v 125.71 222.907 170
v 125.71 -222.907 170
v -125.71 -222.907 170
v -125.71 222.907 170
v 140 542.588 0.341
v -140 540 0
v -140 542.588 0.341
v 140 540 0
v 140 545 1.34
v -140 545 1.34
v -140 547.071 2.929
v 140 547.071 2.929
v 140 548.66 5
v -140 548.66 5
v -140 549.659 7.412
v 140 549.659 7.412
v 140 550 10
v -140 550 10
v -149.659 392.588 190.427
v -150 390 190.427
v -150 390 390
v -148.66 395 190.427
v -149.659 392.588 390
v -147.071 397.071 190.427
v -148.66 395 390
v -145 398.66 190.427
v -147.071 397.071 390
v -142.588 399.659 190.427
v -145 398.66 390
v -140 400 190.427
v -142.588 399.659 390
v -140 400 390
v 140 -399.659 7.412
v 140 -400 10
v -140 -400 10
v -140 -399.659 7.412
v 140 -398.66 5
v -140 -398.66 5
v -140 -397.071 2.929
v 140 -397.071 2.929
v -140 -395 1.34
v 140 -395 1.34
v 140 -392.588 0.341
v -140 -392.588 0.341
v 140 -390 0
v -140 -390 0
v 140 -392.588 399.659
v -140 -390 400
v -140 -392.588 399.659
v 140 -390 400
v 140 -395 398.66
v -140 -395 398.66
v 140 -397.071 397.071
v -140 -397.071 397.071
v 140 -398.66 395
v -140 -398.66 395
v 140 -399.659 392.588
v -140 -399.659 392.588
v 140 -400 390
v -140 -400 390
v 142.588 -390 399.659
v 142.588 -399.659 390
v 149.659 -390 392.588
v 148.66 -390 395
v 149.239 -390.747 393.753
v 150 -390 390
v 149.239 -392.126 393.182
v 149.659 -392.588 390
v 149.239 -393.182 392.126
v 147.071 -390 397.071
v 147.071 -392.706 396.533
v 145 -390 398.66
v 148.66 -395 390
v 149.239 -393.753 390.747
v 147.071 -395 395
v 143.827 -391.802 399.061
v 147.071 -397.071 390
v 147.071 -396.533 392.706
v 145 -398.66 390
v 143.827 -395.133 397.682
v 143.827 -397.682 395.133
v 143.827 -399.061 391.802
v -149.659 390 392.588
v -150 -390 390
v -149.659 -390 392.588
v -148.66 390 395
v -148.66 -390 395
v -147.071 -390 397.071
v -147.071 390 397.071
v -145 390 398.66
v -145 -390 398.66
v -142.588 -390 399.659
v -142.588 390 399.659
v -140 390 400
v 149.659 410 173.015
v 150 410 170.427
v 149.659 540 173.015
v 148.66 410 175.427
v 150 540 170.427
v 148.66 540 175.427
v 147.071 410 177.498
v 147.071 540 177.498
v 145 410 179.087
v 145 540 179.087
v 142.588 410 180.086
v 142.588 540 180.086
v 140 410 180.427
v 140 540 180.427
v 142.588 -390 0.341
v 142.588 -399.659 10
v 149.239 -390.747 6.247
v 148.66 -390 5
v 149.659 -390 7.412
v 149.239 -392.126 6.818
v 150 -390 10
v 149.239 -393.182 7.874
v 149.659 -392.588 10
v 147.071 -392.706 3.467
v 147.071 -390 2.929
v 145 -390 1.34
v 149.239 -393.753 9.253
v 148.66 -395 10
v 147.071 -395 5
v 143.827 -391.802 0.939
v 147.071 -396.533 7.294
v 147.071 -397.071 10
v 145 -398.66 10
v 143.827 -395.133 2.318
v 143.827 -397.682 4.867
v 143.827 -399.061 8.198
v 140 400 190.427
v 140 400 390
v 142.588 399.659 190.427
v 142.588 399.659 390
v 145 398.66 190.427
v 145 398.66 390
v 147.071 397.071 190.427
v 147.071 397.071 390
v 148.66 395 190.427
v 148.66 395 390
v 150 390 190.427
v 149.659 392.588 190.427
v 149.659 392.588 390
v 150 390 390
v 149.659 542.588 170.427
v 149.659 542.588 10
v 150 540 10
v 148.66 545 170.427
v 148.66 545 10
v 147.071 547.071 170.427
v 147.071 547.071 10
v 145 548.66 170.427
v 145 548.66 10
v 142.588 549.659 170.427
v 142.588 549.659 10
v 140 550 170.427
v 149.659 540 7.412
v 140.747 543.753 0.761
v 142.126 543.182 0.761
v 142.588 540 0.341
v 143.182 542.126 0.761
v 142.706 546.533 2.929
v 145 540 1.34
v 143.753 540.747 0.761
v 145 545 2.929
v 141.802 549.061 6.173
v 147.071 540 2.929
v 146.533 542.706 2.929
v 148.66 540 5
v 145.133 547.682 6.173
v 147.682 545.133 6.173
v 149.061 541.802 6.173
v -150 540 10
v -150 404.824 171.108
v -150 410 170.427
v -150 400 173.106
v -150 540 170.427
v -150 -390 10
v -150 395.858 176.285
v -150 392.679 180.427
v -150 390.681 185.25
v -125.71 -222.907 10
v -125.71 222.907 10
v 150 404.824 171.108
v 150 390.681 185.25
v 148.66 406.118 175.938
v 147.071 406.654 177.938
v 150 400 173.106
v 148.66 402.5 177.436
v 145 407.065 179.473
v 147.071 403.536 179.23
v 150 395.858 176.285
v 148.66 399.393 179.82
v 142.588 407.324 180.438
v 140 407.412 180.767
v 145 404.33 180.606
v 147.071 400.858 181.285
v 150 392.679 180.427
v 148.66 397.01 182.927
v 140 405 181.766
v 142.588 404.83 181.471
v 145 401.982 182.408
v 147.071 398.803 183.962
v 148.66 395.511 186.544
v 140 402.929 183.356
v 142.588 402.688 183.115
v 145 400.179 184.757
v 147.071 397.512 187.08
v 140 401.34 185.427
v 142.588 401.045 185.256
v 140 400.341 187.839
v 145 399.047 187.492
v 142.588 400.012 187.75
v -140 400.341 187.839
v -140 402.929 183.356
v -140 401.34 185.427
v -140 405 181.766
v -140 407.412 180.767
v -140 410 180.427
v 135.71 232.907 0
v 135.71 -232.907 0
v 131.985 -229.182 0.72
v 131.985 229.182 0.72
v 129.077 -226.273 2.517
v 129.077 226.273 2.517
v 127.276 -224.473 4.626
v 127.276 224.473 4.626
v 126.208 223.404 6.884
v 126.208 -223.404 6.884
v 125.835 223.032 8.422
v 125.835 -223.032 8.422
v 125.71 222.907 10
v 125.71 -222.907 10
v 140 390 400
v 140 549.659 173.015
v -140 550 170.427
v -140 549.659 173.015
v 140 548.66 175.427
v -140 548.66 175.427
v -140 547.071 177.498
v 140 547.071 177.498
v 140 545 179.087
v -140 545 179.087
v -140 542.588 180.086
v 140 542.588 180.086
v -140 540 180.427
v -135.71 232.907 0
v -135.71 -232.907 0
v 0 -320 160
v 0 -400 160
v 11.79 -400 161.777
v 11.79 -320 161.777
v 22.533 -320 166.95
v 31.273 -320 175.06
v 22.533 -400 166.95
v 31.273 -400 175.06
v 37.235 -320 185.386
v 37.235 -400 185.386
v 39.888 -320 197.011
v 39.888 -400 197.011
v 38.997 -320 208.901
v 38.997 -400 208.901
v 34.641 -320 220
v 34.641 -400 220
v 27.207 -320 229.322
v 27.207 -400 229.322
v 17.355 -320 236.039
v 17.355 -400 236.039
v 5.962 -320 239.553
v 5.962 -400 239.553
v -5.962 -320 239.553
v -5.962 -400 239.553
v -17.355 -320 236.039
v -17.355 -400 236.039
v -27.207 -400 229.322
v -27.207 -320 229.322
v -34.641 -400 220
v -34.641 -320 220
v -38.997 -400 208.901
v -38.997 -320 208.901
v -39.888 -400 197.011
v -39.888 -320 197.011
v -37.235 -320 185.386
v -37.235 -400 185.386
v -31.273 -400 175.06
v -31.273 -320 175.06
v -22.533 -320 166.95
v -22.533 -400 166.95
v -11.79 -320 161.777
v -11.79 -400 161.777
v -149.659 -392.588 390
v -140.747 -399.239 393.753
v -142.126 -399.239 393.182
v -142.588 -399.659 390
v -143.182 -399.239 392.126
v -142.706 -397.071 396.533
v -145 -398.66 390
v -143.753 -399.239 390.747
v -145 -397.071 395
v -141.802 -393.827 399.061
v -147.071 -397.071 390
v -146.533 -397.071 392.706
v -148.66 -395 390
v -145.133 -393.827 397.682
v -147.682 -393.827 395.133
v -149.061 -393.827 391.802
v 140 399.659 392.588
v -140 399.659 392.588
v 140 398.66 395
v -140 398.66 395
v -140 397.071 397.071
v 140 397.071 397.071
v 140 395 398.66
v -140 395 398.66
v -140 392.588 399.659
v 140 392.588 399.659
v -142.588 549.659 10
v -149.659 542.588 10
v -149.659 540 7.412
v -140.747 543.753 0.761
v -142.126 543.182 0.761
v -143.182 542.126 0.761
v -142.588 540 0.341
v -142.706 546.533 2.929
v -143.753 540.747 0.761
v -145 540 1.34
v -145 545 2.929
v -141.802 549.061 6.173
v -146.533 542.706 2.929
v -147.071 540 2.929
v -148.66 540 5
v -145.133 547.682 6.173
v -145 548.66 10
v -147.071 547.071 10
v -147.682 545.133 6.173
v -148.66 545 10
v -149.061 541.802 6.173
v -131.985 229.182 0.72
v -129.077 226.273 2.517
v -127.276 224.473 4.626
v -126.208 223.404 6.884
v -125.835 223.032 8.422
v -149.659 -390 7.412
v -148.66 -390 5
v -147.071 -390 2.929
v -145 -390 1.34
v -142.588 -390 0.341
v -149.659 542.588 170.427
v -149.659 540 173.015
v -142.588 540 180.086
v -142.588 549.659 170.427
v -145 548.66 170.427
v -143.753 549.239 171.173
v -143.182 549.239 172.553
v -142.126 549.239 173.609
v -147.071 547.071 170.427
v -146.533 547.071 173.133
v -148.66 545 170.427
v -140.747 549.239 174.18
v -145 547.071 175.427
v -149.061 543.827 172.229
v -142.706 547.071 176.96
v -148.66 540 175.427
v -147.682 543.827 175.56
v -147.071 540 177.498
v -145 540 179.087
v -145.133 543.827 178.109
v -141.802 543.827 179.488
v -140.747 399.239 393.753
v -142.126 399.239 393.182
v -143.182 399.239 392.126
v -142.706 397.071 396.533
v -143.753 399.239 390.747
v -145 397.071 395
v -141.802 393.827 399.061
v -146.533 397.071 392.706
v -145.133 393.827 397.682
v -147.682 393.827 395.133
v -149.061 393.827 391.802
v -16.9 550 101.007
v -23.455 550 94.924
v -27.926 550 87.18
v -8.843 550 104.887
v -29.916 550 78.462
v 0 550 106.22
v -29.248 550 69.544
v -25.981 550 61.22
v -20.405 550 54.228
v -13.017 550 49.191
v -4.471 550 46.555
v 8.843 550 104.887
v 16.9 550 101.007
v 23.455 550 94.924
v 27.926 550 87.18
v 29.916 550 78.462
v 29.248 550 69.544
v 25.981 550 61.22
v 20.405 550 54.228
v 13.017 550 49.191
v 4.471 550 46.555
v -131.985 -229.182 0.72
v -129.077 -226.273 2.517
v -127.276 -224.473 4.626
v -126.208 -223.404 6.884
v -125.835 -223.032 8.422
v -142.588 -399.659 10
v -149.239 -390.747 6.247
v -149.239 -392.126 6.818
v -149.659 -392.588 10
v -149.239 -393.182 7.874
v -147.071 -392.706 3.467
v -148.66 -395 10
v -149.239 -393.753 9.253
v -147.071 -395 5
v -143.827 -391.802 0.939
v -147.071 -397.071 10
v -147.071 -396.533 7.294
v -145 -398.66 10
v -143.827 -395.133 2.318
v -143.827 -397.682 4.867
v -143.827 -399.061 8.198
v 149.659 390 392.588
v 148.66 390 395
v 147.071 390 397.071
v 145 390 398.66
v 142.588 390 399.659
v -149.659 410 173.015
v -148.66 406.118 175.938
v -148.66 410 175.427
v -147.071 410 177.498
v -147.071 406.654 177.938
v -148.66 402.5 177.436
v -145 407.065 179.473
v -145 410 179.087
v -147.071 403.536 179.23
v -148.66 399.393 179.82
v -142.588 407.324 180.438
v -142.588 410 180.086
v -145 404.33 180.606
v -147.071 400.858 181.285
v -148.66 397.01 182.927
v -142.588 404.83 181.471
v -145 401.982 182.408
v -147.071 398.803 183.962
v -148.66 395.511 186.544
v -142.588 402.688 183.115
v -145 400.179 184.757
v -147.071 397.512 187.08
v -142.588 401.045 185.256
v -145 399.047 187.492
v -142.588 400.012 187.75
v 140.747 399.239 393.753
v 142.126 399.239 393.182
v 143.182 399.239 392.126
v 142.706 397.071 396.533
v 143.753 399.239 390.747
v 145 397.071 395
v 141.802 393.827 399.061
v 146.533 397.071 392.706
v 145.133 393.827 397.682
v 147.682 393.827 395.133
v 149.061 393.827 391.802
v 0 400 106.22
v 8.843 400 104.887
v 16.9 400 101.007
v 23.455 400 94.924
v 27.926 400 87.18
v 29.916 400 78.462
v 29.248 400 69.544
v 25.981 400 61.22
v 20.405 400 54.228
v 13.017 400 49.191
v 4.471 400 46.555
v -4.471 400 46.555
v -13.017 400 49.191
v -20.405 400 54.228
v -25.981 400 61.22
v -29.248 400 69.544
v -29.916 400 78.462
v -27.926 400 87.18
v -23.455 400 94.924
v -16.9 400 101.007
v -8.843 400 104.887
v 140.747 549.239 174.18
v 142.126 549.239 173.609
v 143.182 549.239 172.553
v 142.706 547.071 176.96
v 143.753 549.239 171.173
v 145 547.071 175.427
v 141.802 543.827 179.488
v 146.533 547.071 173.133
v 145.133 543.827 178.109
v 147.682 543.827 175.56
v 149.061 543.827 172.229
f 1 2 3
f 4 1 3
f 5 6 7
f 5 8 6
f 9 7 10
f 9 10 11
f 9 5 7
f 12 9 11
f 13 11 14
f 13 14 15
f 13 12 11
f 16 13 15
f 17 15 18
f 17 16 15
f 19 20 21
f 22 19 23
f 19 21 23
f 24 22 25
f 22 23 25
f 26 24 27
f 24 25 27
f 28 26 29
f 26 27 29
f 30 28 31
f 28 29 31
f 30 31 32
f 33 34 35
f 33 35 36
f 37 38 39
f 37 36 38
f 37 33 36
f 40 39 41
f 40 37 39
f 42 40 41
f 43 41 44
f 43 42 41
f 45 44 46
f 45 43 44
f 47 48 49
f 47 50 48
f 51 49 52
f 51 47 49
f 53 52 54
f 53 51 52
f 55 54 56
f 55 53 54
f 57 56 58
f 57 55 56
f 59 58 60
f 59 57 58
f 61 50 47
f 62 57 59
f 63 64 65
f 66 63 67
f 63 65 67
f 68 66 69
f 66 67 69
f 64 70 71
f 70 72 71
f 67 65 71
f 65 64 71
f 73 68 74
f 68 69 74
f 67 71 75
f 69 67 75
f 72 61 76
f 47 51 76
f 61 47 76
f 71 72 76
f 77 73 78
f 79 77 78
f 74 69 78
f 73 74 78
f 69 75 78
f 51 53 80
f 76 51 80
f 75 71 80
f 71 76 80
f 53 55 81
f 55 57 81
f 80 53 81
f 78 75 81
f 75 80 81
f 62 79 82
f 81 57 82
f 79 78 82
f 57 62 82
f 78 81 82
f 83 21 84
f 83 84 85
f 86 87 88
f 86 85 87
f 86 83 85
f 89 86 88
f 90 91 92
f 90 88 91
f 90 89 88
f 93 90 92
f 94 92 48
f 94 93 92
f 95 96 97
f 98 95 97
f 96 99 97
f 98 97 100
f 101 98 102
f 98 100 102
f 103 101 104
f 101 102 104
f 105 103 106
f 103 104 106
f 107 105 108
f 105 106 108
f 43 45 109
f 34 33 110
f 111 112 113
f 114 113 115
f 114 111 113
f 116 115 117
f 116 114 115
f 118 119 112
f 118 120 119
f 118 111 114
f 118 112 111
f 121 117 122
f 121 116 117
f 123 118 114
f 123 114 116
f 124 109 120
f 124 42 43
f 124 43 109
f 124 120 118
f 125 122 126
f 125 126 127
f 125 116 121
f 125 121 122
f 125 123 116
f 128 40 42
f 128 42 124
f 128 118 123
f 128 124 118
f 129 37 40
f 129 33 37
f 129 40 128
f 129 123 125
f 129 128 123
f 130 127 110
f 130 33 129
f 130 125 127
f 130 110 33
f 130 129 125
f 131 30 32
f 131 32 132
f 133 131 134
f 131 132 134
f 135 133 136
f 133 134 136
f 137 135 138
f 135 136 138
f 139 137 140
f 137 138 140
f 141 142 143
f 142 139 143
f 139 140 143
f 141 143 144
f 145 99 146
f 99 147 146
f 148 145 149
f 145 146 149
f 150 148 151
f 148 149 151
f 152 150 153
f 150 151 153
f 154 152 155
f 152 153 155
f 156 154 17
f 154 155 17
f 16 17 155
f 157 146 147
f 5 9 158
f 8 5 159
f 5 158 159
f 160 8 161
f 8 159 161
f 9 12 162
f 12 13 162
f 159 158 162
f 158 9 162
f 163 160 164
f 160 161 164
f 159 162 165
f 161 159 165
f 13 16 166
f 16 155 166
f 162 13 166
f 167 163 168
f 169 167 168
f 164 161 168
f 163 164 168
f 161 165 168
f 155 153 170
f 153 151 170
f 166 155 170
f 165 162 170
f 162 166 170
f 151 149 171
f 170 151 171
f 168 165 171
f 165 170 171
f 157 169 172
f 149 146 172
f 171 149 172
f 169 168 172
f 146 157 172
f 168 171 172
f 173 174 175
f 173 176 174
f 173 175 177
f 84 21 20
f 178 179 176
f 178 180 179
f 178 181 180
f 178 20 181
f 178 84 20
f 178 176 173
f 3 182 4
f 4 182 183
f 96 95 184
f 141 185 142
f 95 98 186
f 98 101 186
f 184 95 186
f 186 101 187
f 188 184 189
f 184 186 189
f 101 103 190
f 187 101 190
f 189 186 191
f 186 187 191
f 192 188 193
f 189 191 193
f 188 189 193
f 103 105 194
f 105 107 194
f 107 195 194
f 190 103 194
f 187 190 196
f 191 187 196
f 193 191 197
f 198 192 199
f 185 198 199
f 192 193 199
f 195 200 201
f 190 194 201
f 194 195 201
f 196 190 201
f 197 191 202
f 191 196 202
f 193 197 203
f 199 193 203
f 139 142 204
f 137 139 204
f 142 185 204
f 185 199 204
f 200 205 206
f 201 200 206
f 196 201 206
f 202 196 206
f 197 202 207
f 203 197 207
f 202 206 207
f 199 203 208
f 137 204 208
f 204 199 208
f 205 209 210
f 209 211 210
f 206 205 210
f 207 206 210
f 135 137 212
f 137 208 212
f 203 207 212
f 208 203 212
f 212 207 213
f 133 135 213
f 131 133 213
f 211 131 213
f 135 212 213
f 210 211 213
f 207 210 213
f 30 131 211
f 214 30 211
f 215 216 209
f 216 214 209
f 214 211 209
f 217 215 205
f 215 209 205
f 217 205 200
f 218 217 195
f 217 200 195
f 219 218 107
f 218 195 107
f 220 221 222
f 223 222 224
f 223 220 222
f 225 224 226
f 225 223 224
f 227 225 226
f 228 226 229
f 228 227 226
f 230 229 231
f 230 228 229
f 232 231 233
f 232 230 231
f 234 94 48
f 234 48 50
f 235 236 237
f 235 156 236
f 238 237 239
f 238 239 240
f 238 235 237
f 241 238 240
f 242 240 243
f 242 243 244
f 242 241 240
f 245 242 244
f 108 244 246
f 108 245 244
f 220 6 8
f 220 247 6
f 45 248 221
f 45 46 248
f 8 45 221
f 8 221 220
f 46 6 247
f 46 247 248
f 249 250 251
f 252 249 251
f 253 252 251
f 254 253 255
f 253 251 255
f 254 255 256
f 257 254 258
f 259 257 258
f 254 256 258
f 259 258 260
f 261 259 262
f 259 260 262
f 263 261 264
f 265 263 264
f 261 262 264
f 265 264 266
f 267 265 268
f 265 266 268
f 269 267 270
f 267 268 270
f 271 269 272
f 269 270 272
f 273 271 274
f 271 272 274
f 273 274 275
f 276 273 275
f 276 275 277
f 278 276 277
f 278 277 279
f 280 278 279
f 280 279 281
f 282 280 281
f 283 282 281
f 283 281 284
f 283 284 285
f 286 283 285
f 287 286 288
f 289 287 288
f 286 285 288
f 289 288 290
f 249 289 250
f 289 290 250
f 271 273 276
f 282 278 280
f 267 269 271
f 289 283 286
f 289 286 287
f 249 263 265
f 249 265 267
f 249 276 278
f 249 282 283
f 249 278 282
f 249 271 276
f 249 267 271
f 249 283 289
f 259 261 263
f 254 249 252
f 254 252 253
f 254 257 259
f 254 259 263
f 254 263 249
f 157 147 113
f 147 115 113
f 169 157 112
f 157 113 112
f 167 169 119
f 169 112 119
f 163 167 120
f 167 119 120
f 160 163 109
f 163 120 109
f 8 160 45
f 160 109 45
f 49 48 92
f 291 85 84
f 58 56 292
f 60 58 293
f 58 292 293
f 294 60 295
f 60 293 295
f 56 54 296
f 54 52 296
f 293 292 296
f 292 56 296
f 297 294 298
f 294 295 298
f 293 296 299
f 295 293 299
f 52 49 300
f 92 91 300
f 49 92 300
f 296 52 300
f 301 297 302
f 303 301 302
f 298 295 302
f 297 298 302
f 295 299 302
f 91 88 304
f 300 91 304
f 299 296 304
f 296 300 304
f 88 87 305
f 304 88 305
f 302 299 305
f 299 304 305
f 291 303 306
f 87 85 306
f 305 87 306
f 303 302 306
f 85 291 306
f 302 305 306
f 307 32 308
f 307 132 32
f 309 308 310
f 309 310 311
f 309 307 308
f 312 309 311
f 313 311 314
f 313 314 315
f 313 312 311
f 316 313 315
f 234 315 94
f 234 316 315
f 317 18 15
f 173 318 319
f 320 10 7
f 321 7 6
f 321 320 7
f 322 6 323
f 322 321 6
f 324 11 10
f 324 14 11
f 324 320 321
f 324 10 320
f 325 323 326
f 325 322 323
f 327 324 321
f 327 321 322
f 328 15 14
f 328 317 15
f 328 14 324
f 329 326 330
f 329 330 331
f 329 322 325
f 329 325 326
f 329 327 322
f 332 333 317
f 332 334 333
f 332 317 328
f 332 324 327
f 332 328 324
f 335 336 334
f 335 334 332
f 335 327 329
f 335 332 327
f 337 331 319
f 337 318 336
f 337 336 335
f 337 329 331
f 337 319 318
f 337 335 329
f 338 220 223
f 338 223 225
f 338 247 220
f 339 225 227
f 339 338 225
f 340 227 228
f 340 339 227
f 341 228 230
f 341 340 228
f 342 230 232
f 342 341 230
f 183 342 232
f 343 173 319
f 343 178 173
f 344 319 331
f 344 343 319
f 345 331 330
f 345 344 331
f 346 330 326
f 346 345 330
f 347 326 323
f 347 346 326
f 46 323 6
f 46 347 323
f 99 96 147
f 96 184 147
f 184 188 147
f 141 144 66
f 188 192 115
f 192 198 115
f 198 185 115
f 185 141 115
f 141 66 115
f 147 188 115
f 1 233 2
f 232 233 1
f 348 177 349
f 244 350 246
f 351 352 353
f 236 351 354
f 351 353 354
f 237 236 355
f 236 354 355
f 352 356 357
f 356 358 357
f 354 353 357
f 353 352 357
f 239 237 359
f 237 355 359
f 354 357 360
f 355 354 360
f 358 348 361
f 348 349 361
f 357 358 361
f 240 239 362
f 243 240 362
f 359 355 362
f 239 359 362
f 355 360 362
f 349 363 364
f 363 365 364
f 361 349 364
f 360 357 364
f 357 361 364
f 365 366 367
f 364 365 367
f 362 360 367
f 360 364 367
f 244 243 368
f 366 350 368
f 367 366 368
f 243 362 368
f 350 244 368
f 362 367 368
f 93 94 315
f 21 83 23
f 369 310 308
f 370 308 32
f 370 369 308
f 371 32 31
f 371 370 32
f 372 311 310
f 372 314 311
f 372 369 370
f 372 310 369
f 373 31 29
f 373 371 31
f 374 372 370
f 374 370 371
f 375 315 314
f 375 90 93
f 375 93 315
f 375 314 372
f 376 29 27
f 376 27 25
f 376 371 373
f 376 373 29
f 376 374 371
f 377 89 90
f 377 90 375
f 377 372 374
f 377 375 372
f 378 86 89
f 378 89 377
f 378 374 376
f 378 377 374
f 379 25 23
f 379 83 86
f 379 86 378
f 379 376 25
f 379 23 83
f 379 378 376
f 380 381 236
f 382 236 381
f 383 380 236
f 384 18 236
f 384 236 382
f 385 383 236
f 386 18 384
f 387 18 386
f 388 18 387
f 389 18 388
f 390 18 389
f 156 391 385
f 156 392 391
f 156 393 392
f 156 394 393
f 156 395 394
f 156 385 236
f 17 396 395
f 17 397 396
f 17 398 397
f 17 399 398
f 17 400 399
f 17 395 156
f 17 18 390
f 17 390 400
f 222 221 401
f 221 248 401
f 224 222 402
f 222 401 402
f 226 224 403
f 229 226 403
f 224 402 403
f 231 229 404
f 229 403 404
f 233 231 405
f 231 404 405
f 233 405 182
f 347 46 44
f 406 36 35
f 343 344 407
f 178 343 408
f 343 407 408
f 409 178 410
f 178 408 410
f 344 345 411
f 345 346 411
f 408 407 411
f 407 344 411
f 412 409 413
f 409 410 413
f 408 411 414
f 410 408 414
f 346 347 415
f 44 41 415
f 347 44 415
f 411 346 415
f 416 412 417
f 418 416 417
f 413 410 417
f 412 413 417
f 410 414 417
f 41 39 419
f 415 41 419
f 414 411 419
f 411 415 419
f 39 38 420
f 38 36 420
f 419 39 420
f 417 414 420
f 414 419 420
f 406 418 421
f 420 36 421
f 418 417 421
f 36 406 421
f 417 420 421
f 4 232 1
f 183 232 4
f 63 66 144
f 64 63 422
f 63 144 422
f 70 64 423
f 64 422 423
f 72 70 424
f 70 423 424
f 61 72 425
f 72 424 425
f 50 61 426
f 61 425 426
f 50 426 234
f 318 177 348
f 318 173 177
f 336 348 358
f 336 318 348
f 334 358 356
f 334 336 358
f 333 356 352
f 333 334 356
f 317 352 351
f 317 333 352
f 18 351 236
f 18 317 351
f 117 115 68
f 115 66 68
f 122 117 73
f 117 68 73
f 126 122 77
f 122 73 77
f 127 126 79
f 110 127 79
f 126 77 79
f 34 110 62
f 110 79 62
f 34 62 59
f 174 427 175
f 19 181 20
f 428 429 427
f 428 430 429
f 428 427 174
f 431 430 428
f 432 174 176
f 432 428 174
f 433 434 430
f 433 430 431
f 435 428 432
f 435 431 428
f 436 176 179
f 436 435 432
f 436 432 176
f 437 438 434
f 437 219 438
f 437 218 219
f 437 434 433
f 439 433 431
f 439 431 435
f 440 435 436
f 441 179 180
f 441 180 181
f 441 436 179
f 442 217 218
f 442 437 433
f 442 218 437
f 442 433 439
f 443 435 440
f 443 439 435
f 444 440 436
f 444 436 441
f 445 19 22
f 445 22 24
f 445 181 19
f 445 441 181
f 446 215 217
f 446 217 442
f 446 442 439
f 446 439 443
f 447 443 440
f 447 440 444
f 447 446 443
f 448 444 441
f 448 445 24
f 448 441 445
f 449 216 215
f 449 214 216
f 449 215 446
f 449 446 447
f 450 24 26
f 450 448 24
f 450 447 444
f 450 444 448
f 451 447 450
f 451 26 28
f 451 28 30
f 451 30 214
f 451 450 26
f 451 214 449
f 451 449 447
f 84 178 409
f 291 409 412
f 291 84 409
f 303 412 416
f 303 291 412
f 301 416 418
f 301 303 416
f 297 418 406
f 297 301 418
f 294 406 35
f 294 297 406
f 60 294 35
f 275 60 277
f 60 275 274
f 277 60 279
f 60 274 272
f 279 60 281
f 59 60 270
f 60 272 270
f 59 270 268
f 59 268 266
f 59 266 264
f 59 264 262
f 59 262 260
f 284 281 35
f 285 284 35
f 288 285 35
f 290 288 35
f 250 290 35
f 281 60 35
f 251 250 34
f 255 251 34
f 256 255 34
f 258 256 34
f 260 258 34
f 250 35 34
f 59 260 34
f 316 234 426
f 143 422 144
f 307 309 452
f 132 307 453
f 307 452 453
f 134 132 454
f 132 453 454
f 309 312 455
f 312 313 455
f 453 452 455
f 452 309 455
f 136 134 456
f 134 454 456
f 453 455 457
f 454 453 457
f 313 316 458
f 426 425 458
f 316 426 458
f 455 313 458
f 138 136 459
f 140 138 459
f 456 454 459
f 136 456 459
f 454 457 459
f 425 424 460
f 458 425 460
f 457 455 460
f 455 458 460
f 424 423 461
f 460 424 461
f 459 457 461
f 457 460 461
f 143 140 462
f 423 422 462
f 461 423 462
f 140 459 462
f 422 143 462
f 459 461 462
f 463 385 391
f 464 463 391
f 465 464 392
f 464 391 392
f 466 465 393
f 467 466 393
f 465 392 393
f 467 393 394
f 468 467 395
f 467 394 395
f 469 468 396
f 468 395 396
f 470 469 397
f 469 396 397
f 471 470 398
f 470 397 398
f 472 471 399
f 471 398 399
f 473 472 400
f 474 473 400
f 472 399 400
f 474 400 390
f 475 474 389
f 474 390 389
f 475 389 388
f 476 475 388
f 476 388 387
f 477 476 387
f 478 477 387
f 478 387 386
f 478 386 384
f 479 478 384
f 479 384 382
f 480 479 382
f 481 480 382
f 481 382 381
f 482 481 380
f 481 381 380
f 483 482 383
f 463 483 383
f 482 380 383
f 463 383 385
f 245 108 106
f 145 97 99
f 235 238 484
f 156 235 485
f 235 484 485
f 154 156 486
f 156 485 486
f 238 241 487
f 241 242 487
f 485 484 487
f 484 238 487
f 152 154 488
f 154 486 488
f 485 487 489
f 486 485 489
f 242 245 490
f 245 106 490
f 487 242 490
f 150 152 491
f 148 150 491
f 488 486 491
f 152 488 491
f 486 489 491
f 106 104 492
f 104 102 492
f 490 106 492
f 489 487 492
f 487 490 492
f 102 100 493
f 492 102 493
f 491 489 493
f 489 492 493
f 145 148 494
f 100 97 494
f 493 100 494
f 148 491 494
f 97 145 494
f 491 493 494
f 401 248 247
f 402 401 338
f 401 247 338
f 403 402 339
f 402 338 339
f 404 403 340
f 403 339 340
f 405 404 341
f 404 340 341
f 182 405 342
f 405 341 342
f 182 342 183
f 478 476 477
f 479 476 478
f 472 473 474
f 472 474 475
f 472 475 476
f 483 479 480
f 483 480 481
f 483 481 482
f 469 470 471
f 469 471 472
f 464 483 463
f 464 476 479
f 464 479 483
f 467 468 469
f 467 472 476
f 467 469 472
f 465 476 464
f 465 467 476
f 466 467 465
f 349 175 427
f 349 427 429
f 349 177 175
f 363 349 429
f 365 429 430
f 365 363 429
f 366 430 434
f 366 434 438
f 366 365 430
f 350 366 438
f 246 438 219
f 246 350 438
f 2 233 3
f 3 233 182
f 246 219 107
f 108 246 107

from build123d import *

# Parameters (mm, degrees)
SKETCH1_W           = 300
SKETCH1_H           = 800
BOSS_EXTRUDE1_DEPTH = 400
SKETCH3_W           = 300
SKETCH3_H           = 180.426730866
BOSS_EXTRUDE4_DEPTH = 150
FILLET6_R           = 10
SKETCH4_R           = 30
CUT_EXTRUDE1_DEPTH  = 150
SKETCH7_W           = 251.42002043
SKETCH7_H           = 445.81306925
CUT_EXTRUDE5_DEPTH  = 170
SKETCH8_R           = 40
CUT_EXTRUDE6_DEPTH  = 80
FILLET8_R           = 10


with BuildPart() as part:
    # Sketch1 → Boss-Extrude1 (new body)
    with BuildSketch(Plane.XY):
        Rectangle(SKETCH1_W, SKETCH1_H)
    extrude(amount=BOSS_EXTRUDE1_DEPTH)

    # Sketch3 → Boss-Extrude4 (add)
    with BuildSketch(Plane(origin=(0, 400, 0), x_dir=(1, 0, 0), z_dir=(0, 1, 0))):
        with Locations((0, -90.213365433)):
            Rectangle(SKETCH3_W, SKETCH3_H)
    extrude(amount=BOSS_EXTRUDE4_DEPTH)

    # Fillet6
    fillet6_edges = [part.edges().sort_by_distance(p)[0] for p in [
        (-150, 0, 400),
        (0, -400, 400),
        (0, 400, 180.426730866),
        (-150, 475, 180.426730866),
        (150, 475, 180.426730866),
        (-150, 550, 90.213365433),
        (0, 550, 180.426730866),
        (150, 550, 90.213365433),
        (0, 550, 0),
        (150, 0, 400),
        (0, -400, 0),
        (-150, 75, 0),
        (150, 75, 0),
        (0, 400, 400),
        (150, -400, 200),
        (-150, -400, 200),
        (-150, 400, 290.213365433),
        (150, 400, 290.213365433),
    ]]
    fillet(fillet6_edges, radius=FILLET6_R)

    # Sketch4 → Cut-Extrude1 (cut)
    with BuildSketch(Plane(origin=(0, 550, 0), x_dir=(1, 0, 0), z_dir=(0, 1, 0))):
        with Locations(Location((0, -76.219748714, 0), (0, 0, 270))):
            Circle(SKETCH4_R)
    extrude(amount=-CUT_EXTRUDE1_DEPTH, mode=Mode.SUBTRACT)

    # Sketch7 → Cut-Extrude5 (cut)
    with BuildSketch(Plane(origin=(0, 0, 0), x_dir=(-1, 0, 0), z_dir=(0, 0, -1))):
        Rectangle(SKETCH7_W, SKETCH7_H)
    extrude(amount=-CUT_EXTRUDE5_DEPTH, mode=Mode.SUBTRACT)

    # Sketch8 → Cut-Extrude6 (cut)
    with BuildSketch(Plane.XZ.offset(400)):
        with Locations(Location((0, 200, 0), (0, 0, 270))):
            Circle(SKETCH8_R)
    extrude(amount=-CUT_EXTRUDE6_DEPTH, mode=Mode.SUBTRACT)

    # Fillet8
    fillet8_edges = [part.edges().sort_by_distance(p)[0] for p in [
        (-125.710010215, 0, 0),
        (0, 222.906534625, 0),
        (125.710010215, 0, 0),
        (0, -222.906534625, 0),
    ]]
    fillet(fillet8_edges, radius=FILLET8_R)


solid = part.part
